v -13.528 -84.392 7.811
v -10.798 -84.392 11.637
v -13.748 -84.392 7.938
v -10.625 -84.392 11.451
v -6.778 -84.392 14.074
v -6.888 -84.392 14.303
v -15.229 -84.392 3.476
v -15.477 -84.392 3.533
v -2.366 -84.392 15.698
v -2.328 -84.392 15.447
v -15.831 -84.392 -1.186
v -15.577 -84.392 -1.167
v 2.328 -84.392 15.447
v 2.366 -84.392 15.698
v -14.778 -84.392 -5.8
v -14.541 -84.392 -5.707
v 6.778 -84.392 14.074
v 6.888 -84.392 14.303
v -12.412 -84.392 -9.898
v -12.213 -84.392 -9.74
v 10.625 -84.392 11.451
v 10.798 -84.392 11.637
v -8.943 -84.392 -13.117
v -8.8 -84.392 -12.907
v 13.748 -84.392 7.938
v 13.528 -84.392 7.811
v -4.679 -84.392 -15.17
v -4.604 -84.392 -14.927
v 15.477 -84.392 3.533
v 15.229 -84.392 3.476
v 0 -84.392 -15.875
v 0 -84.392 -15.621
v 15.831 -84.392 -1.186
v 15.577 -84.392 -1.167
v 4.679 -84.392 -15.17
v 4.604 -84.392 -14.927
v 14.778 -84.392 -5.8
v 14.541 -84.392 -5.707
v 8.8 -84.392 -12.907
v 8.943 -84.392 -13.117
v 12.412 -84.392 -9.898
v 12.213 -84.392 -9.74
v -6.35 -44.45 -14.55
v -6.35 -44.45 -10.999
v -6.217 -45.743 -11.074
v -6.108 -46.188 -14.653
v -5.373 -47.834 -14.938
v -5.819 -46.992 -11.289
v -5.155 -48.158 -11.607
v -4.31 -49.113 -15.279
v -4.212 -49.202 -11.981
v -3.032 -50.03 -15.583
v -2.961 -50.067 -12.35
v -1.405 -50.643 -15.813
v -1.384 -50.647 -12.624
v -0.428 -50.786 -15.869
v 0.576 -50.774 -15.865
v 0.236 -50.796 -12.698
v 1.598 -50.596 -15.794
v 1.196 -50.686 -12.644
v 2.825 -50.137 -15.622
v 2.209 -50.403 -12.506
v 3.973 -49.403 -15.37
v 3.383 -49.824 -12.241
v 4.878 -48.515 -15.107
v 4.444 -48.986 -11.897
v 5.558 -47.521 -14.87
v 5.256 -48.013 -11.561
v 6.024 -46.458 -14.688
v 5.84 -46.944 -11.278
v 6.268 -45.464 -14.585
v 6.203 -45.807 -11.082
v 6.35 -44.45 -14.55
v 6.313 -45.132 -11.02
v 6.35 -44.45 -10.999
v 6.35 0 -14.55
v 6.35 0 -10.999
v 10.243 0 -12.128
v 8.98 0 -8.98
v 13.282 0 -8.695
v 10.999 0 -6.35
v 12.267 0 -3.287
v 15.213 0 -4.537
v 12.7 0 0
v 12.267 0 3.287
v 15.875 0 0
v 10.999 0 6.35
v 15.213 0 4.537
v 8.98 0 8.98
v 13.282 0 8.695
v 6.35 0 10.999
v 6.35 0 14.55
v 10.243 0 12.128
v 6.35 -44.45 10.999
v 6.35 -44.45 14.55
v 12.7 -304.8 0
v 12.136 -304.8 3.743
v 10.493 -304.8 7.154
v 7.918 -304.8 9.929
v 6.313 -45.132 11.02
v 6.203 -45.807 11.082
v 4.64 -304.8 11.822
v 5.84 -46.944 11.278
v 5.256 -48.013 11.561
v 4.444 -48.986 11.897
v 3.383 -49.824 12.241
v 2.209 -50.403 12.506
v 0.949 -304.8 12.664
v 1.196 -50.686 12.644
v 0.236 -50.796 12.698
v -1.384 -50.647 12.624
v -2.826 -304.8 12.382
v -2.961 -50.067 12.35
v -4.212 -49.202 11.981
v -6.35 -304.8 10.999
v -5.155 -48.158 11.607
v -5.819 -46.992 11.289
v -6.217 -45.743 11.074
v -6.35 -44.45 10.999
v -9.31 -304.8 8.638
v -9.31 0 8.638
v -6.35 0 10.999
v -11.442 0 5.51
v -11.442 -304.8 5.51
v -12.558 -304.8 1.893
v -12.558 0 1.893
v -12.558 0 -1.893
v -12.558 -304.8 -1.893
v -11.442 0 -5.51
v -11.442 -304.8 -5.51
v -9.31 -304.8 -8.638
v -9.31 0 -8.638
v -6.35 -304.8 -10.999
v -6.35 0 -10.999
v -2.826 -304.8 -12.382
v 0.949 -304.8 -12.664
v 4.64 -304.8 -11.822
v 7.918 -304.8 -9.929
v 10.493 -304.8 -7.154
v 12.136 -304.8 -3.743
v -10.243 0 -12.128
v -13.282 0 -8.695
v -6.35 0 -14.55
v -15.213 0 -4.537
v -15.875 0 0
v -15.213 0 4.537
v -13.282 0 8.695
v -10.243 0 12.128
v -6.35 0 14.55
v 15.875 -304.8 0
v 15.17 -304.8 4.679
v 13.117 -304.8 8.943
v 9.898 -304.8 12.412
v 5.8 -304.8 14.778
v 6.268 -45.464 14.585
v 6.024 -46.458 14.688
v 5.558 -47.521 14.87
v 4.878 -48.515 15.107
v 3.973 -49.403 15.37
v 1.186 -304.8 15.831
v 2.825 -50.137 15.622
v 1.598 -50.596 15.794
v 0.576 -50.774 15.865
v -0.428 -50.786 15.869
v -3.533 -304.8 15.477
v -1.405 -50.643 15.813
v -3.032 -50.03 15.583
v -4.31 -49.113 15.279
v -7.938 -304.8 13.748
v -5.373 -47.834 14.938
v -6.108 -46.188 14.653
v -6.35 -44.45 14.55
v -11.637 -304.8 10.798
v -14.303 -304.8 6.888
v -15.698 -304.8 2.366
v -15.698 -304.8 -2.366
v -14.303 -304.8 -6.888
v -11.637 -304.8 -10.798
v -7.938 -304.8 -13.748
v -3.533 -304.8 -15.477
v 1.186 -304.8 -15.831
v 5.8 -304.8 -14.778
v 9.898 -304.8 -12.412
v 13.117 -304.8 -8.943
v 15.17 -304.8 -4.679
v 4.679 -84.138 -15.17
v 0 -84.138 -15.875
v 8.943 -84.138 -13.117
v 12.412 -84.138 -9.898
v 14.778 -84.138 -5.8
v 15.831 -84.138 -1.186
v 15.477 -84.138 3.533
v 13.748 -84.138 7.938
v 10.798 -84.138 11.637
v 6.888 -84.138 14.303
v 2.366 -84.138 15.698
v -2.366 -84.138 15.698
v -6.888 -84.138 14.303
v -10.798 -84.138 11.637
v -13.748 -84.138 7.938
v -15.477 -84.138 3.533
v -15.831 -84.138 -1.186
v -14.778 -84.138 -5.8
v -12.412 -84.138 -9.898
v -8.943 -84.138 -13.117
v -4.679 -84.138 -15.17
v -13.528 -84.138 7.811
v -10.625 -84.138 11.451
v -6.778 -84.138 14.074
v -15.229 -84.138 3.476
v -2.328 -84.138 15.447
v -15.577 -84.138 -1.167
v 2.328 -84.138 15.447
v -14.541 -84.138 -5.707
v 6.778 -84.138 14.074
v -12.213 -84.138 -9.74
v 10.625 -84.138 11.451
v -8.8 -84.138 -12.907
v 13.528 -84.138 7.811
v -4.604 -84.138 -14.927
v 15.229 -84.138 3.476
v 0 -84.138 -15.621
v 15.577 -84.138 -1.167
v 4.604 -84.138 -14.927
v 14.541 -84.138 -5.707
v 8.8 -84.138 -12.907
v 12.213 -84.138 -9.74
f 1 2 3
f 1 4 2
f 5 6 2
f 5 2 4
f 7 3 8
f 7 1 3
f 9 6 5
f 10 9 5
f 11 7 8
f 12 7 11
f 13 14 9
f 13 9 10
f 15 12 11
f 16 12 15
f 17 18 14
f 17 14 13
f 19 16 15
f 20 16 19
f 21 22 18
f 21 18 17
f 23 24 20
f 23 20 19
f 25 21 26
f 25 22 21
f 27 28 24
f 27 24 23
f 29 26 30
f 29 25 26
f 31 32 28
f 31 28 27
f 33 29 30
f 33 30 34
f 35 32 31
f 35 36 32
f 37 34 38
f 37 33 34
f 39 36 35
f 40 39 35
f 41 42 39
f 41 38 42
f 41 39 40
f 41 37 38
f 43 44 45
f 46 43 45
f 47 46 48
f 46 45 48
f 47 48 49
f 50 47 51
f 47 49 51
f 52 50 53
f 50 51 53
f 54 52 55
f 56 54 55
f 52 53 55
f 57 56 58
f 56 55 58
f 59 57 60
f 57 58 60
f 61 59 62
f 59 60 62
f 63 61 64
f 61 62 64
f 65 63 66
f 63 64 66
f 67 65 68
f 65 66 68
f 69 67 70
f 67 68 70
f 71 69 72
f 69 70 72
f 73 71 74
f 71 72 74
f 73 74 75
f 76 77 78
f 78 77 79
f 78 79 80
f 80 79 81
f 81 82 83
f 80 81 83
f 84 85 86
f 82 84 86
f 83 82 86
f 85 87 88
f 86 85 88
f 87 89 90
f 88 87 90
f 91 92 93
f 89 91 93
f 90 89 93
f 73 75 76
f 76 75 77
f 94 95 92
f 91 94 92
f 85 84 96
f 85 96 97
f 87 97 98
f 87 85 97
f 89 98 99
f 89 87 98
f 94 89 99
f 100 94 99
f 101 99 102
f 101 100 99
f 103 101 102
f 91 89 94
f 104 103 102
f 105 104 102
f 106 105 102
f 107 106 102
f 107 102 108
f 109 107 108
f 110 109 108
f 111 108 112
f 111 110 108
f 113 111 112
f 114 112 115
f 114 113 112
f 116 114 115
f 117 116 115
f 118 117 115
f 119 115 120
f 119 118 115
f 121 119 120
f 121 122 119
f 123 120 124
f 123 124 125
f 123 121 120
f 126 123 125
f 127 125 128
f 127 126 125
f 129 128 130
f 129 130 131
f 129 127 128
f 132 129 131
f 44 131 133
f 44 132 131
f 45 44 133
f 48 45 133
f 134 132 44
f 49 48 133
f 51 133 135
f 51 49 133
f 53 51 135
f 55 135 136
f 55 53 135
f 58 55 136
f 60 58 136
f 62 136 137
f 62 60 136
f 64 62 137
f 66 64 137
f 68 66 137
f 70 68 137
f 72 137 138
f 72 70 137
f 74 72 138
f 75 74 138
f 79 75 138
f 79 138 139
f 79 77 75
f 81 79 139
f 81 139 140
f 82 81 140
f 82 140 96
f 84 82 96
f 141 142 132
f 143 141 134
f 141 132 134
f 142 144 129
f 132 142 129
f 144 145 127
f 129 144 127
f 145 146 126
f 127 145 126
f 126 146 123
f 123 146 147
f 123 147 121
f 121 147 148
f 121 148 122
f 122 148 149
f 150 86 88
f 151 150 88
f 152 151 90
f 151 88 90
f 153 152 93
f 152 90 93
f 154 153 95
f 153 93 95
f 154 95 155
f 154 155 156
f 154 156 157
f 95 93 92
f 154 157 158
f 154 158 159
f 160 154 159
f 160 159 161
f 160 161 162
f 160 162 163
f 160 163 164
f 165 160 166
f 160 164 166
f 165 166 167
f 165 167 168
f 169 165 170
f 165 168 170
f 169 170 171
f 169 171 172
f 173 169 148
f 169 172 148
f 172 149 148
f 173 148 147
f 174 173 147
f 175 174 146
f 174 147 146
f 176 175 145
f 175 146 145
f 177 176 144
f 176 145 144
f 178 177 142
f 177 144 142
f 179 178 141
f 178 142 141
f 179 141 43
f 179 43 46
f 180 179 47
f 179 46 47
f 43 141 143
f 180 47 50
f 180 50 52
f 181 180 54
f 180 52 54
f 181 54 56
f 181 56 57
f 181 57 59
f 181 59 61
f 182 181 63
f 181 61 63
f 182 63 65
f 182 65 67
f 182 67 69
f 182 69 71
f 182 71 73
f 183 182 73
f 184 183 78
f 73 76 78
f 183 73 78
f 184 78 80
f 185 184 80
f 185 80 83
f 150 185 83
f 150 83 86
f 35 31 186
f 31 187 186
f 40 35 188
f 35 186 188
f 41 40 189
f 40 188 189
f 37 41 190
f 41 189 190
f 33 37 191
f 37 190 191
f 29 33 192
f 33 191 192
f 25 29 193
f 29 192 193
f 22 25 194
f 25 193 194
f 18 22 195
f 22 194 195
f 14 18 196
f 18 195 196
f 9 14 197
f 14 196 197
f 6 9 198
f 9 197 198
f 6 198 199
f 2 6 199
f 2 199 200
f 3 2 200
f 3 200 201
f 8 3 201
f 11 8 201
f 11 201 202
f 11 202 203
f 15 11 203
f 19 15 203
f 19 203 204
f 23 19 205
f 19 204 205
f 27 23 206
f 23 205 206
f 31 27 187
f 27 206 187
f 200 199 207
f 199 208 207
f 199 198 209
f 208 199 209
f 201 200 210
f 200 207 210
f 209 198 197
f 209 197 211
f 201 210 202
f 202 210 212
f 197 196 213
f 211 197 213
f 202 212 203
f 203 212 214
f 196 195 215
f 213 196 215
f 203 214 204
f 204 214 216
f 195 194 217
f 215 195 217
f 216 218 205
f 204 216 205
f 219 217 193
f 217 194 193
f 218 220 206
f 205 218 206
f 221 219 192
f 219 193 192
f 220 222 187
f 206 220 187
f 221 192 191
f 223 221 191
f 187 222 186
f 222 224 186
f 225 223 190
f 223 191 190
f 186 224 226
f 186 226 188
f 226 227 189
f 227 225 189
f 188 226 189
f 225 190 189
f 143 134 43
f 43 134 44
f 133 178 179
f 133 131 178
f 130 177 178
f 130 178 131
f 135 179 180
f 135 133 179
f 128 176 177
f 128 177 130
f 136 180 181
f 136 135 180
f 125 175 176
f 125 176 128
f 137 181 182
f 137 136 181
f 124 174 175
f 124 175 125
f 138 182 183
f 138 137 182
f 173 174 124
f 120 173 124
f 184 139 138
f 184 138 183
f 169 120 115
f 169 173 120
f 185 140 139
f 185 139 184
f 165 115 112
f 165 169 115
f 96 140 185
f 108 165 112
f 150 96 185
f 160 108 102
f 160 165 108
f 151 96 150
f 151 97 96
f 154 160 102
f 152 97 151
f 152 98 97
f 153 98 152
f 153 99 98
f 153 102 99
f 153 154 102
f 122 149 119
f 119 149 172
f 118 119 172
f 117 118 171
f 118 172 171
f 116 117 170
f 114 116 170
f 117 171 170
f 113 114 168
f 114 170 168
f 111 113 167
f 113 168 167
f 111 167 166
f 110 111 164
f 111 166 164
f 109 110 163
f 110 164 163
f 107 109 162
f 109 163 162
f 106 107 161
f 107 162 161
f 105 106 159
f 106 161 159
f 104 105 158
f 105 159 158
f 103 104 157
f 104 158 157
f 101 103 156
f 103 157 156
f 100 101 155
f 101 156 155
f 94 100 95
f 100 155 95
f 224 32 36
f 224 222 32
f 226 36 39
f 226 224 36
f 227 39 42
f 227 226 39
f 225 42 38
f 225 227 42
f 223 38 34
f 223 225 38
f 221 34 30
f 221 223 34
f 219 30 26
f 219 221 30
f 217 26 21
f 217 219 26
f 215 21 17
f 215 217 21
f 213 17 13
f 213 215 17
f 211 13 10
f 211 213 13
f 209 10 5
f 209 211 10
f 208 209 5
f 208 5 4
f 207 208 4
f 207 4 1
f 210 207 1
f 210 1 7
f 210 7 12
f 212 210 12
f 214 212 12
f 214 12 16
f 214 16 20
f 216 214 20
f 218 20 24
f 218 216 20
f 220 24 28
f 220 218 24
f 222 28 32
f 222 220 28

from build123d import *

# Parameters (mm, degrees)
F0_R     = 15.875
F0_R_2   = 12.7
F1_DEPTH = 304.8
F3_DEPTH = 25.4
F4_W     = 0.254
F4_H     = 0.254


with BuildPart() as f1:
    # F0 (on Front) → F1 (new body)
    with BuildSketch(Plane.XZ):
        Circle(F0_R)
        Circle(F0_R_2, mode=Mode.SUBTRACT)
    extrude(amount=F1_DEPTH)

    # F2 (on Top) → F3 (cut, symmetric)
    with BuildSketch(Plane.XY):
        with BuildLine():
            Line((6.35, 0), (-6.35, 0))
            Line((-6.35, 0), (-6.35, -44.45))
            ThreePointArc((-6.35, -44.45), (0, -50.8), (6.35, -44.45))
            Line((6.35, -44.45), (6.35, 0))
        make_face()
    extrude(amount=F3_DEPTH, both=True, mode=Mode.SUBTRACT)


with BuildPart() as f5:
    # F4 (on Right) → F5 (revolve)
    with BuildSketch(Plane.YZ):
        with Locations((-84.2645, -15.748)):
            Rectangle(F4_W, F4_H)
    revolve(axis=Axis((0, -42.06875, 0), (0, -1, 0)))


solid = Compound([f1.part, f5.part])
